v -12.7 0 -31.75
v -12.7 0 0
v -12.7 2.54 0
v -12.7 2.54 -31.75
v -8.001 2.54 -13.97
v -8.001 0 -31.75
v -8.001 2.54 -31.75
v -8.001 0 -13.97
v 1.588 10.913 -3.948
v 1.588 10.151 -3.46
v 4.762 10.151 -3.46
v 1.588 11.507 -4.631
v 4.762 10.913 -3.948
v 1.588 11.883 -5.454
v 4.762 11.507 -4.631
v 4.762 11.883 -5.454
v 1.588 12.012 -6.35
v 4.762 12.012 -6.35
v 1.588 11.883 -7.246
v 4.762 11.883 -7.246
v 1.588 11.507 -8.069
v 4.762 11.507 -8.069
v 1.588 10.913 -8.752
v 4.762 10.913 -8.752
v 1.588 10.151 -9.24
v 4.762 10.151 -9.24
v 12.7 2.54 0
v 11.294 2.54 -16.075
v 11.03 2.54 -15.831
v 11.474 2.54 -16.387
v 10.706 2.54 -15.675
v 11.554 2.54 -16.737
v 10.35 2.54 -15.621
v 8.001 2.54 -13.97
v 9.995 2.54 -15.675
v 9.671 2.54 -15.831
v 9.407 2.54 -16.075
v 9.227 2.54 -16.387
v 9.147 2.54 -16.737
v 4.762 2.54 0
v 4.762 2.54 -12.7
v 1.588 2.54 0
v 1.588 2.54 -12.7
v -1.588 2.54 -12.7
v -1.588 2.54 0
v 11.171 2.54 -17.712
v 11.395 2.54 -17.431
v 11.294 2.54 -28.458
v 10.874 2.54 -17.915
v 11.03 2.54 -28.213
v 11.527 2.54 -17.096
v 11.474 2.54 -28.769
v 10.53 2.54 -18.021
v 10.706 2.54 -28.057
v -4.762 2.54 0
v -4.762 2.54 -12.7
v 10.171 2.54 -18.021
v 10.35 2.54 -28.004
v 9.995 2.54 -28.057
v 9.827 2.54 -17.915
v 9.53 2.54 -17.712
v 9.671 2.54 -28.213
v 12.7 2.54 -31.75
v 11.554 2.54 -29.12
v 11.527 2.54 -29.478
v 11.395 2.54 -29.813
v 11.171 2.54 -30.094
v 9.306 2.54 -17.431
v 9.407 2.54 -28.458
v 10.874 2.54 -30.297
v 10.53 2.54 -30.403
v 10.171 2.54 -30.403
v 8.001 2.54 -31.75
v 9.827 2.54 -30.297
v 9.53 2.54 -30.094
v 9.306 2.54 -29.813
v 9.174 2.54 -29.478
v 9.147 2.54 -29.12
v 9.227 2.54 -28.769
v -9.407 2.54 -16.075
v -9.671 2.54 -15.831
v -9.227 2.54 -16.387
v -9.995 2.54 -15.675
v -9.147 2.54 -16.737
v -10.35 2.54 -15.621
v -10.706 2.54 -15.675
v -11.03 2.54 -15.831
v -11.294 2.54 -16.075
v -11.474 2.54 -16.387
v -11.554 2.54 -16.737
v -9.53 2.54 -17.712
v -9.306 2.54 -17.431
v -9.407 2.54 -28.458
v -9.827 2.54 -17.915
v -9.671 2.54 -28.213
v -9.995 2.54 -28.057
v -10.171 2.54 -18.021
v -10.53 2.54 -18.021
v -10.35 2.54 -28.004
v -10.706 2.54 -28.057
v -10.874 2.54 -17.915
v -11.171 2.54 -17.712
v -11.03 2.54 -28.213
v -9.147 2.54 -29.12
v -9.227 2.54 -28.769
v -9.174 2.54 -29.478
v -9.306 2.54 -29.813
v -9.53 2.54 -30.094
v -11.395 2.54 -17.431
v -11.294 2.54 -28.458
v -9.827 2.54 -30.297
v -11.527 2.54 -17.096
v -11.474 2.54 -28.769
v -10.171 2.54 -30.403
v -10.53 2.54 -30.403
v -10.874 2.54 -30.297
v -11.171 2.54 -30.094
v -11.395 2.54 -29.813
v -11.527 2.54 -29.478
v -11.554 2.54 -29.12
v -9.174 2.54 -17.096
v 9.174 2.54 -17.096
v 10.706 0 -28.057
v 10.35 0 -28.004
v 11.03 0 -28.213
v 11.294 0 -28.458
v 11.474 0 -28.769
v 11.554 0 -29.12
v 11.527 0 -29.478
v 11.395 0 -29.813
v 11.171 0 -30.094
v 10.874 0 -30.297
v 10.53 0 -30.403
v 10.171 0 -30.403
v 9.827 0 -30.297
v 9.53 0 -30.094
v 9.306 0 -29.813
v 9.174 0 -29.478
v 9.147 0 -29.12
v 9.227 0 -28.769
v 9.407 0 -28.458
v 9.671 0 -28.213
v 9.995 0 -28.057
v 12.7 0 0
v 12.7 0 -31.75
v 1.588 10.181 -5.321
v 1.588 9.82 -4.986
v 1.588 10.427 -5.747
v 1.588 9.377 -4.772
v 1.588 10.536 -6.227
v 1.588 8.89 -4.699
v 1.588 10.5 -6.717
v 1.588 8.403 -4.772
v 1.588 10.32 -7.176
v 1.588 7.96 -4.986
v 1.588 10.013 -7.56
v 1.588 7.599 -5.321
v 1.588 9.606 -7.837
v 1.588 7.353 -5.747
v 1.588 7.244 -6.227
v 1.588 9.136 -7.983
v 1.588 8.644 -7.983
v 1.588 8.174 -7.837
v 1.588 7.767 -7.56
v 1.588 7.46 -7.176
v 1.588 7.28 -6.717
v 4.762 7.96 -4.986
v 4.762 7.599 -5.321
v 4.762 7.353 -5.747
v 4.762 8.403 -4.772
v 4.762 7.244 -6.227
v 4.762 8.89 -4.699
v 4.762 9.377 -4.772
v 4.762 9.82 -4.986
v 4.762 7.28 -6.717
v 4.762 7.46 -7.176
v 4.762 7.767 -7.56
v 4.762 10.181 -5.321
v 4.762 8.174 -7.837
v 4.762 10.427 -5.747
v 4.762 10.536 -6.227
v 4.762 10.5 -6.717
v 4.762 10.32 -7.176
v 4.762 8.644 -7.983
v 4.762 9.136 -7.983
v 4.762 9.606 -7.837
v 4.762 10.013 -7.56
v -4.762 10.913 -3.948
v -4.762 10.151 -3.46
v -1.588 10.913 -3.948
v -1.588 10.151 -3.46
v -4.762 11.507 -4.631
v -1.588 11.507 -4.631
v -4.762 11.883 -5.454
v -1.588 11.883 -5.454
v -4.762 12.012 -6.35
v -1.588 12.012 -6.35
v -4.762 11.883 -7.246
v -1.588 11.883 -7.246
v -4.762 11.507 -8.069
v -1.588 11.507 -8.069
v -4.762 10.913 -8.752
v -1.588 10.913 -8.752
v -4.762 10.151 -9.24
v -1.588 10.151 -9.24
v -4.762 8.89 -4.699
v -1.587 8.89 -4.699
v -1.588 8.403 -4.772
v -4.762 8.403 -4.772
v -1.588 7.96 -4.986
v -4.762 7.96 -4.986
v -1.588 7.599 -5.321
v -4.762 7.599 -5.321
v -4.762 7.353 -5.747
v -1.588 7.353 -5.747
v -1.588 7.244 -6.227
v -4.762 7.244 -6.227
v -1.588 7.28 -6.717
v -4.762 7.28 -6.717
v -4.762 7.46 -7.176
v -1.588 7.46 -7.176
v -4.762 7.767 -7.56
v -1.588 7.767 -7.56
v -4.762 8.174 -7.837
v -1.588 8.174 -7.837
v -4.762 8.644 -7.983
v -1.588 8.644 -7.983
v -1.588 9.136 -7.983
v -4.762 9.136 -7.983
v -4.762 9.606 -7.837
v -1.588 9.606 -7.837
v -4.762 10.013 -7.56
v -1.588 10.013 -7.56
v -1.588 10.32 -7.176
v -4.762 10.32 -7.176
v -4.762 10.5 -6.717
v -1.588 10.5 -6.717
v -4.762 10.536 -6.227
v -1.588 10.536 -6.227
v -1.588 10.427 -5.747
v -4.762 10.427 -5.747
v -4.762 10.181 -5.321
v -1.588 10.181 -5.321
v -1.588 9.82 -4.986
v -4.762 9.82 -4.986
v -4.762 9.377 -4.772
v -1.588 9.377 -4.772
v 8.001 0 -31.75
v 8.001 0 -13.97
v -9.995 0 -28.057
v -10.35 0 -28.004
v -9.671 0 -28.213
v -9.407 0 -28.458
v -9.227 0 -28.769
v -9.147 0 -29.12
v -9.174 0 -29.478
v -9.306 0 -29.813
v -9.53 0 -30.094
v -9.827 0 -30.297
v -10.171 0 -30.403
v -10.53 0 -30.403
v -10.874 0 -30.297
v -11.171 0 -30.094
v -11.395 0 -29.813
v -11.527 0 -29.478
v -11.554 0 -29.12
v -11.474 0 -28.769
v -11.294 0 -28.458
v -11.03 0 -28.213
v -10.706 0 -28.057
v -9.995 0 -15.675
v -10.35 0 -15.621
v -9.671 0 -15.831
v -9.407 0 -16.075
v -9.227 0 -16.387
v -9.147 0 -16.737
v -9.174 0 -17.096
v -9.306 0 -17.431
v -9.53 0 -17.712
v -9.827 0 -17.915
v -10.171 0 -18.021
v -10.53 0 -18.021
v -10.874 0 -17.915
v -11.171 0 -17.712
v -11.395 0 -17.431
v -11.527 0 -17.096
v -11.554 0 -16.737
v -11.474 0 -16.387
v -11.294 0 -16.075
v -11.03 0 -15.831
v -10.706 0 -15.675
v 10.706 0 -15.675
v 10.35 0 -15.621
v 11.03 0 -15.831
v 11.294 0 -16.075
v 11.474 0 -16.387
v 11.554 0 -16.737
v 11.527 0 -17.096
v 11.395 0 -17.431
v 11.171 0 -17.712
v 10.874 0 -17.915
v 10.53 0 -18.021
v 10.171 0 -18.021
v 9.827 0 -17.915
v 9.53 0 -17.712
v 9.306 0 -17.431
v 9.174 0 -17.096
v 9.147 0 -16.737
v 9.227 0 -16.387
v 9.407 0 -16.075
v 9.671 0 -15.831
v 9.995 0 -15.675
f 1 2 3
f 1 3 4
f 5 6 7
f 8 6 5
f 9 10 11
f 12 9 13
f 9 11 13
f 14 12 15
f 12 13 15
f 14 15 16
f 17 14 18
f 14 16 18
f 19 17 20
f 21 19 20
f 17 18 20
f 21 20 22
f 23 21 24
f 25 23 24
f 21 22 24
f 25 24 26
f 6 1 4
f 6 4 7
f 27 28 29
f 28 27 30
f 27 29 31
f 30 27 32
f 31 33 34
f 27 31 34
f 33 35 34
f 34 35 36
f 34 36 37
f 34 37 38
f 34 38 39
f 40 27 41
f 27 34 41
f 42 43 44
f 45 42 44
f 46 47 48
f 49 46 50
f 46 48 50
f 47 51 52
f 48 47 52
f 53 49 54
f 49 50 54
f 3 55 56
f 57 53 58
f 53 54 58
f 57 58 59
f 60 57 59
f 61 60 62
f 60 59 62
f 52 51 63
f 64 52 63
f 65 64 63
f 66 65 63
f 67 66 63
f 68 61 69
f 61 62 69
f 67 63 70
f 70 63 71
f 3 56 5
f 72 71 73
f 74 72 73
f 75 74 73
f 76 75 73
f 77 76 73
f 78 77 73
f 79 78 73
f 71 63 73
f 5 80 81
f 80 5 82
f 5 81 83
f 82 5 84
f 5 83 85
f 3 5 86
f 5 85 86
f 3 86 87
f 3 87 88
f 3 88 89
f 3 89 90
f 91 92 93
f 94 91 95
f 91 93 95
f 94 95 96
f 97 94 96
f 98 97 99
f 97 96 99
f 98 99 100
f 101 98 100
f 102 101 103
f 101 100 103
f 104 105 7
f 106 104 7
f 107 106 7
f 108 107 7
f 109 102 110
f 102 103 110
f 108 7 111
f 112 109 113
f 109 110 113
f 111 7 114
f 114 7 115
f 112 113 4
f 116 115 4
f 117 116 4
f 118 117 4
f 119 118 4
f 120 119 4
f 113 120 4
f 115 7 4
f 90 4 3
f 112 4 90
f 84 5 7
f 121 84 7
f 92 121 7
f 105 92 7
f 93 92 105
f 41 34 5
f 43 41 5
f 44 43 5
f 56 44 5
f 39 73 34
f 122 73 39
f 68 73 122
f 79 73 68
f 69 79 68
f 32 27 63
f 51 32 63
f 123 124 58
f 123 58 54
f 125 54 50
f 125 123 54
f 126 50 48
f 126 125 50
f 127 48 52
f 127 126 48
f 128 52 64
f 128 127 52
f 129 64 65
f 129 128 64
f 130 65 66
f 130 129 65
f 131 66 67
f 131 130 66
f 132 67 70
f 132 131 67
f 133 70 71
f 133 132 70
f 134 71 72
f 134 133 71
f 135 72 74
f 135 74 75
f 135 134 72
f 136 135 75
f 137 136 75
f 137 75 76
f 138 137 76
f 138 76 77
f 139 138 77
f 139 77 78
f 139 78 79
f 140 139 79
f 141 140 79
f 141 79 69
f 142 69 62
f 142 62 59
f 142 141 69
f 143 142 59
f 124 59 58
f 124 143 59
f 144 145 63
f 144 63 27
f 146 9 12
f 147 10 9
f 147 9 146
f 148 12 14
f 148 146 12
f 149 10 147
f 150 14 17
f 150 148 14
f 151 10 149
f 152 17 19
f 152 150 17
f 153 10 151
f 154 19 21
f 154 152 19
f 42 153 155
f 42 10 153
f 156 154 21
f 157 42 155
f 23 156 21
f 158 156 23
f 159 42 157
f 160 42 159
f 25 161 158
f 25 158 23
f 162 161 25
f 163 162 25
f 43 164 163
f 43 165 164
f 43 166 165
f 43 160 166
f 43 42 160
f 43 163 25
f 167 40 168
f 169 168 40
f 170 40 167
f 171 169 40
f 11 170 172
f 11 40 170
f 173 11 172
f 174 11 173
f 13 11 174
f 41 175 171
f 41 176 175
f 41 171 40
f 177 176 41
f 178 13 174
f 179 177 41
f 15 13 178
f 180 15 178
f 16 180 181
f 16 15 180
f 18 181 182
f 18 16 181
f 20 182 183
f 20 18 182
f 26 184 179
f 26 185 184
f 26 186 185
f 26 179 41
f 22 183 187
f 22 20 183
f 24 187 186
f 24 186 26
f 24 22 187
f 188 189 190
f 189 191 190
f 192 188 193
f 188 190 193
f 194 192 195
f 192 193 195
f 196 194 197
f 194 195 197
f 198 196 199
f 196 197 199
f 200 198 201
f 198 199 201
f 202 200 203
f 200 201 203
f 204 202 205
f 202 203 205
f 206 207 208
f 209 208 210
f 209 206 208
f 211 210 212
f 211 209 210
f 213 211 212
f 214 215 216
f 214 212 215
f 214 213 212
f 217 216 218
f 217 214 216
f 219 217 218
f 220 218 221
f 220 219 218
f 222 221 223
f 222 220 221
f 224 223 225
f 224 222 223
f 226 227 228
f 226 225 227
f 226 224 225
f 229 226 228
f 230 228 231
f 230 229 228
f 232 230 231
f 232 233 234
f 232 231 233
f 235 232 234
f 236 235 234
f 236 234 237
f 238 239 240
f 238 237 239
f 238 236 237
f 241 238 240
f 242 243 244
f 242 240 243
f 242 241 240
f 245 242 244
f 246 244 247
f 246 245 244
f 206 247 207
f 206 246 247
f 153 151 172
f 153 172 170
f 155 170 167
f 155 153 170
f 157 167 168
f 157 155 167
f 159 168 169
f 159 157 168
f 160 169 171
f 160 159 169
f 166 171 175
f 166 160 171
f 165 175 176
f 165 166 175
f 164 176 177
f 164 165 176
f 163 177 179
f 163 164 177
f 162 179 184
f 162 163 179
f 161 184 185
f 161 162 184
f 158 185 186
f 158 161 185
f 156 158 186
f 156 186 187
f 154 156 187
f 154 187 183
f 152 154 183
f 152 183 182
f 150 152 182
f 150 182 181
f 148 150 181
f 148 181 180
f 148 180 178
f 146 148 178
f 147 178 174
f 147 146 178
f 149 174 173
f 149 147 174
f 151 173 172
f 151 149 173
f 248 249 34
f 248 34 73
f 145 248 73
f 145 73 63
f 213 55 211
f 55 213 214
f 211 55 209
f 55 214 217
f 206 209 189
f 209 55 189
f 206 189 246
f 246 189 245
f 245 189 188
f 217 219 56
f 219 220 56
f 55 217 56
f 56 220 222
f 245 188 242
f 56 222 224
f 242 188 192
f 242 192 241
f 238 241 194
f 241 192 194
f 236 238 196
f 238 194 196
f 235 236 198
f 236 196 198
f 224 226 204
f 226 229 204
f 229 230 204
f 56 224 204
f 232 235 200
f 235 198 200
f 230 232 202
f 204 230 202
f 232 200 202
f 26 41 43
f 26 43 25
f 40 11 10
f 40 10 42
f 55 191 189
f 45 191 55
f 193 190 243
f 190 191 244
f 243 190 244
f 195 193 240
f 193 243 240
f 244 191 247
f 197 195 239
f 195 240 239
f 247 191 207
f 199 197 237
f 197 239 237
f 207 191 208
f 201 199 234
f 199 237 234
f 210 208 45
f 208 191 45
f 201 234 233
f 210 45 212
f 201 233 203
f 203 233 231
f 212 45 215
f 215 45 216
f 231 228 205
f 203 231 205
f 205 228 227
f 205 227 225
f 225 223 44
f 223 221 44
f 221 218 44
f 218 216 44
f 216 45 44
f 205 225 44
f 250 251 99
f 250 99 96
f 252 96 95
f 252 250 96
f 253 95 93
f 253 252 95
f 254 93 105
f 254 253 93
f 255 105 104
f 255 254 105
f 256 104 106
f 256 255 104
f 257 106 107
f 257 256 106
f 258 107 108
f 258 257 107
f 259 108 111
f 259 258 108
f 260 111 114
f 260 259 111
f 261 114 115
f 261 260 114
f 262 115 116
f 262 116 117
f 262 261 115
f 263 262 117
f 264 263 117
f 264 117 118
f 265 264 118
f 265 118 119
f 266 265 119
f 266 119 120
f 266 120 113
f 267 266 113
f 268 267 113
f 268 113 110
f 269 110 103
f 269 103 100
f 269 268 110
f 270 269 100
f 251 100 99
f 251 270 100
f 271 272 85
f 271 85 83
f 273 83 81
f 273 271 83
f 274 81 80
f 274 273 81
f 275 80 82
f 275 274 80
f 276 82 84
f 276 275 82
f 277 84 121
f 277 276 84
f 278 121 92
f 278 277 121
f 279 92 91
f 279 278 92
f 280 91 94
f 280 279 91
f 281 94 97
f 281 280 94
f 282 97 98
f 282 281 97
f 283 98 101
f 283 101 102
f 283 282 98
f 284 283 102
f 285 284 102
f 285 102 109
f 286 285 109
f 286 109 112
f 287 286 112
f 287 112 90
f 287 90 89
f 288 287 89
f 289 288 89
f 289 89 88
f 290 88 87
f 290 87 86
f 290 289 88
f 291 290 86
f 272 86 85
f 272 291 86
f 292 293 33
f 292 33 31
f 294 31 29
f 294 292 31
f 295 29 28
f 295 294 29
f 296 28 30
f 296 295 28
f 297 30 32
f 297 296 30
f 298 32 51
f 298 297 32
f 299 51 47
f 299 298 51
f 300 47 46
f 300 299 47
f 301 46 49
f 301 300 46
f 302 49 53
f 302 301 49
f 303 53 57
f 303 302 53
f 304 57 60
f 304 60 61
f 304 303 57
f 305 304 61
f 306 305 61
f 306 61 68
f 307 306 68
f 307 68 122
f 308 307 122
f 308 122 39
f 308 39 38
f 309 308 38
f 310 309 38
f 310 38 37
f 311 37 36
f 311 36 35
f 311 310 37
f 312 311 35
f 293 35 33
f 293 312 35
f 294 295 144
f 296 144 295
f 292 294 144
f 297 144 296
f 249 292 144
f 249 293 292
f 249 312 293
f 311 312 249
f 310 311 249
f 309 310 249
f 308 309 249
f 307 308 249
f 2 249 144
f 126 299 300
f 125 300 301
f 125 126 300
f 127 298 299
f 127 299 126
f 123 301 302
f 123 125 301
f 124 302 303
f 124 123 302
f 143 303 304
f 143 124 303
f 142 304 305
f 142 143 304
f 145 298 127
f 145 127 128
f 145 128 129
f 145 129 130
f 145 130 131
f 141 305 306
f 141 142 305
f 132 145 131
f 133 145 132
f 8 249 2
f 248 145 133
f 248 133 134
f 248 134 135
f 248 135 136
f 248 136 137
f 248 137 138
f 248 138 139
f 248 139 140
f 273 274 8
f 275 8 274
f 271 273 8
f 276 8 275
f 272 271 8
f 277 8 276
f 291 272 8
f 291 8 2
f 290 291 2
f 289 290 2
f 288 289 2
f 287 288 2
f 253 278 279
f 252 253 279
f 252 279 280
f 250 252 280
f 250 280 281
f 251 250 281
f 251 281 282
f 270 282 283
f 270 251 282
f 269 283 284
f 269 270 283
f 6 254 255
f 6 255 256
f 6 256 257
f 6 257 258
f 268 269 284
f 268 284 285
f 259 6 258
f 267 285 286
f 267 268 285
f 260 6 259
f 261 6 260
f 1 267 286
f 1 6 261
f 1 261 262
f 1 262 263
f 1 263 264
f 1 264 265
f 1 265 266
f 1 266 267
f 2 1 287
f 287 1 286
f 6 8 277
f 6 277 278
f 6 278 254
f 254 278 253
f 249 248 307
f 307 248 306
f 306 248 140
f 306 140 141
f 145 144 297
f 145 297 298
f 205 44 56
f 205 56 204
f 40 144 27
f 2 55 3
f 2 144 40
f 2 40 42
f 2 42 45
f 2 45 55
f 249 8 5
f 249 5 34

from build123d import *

# Parameters (mm, degrees)
SKETCH1_R           = 1.2065
BOSS_EXTRUDE1_DEPTH = 2.54
SKETCH2_R           = 1.651
BOSS_EXTRUDE2_DEPTH = 4.7625
SKETCH3_W           = 3.175
SKETCH3_H           = 12.7
CUT_EXTRUDE1_DEPTH  = 13.97
FILLET1_R           = 3.175


with BuildPart() as part:
    # Sketch1 → Boss-Extrude1 (new body)
    with BuildSketch(Plane(origin=(0, 0, 0), x_dir=(1, 0, 0), z_dir=(0, 1, 0))):
        Polygon((-12.7, 0), (-12.7, 31.75), (-8.001, 31.75), (-8.001, 13.97), (8.001, 13.97), (8.001, 31.75), (12.7, 31.75), (12.7, 0), align=None)
        with Locations(Location((-10.3505, 29.21, 0), (0, 0, 270))):
            Circle(SKETCH1_R, mode=Mode.SUBTRACT)
        with Locations(Location((-10.3505, 16.8275, 0), (0, 0, 270))):
            Circle(SKETCH1_R, mode=Mode.SUBTRACT)
        with Locations(Location((10.3505, 29.21, 0), (0, 0, 270))):
            Circle(SKETCH1_R, mode=Mode.SUBTRACT)
        with Locations(Location((10.3505, 16.8275, 0), (0, 0, 270))):
            Circle(SKETCH1_R, mode=Mode.SUBTRACT)
    extrude(amount=BOSS_EXTRUDE1_DEPTH)

    # Sketch2 → Boss-Extrude2 (add, symmetric)
    with BuildSketch(Plane(origin=(0, 0, 0), x_dir=(0, 0, -1), z_dir=(1, 0, 0))):
        Polygon((12.7, 2.54), (6.35, 16.51), (0, 2.54), align=None)
        with Locations(Location((6.35, 8.89, 0), (0, 0, 180))):
            Circle(SKETCH2_R, mode=Mode.SUBTRACT)
    extrude(amount=BOSS_EXTRUDE2_DEPTH, both=True)

    # Sketch3 → Cut-Extrude1 (cut)
    with BuildSketch(Plane(origin=(0, 2.54, 0), x_dir=(1, 0, 0), z_dir=(0, 1, 0))):
        with Locations((0, 6.35)):
            Rectangle(SKETCH3_W, SKETCH3_H)
    extrude(amount=CUT_EXTRUDE1_DEPTH, mode=Mode.SUBTRACT)

    # Fillet1
    fillet1_edges = [part.edges().sort_by_distance(p)[0] for p in [
        (3.175, 16.51, -6.35),
        (-3.175, 16.51, -6.35),
    ]]
    fillet(fillet1_edges, radius=FILLET1_R)


solid = part.part
